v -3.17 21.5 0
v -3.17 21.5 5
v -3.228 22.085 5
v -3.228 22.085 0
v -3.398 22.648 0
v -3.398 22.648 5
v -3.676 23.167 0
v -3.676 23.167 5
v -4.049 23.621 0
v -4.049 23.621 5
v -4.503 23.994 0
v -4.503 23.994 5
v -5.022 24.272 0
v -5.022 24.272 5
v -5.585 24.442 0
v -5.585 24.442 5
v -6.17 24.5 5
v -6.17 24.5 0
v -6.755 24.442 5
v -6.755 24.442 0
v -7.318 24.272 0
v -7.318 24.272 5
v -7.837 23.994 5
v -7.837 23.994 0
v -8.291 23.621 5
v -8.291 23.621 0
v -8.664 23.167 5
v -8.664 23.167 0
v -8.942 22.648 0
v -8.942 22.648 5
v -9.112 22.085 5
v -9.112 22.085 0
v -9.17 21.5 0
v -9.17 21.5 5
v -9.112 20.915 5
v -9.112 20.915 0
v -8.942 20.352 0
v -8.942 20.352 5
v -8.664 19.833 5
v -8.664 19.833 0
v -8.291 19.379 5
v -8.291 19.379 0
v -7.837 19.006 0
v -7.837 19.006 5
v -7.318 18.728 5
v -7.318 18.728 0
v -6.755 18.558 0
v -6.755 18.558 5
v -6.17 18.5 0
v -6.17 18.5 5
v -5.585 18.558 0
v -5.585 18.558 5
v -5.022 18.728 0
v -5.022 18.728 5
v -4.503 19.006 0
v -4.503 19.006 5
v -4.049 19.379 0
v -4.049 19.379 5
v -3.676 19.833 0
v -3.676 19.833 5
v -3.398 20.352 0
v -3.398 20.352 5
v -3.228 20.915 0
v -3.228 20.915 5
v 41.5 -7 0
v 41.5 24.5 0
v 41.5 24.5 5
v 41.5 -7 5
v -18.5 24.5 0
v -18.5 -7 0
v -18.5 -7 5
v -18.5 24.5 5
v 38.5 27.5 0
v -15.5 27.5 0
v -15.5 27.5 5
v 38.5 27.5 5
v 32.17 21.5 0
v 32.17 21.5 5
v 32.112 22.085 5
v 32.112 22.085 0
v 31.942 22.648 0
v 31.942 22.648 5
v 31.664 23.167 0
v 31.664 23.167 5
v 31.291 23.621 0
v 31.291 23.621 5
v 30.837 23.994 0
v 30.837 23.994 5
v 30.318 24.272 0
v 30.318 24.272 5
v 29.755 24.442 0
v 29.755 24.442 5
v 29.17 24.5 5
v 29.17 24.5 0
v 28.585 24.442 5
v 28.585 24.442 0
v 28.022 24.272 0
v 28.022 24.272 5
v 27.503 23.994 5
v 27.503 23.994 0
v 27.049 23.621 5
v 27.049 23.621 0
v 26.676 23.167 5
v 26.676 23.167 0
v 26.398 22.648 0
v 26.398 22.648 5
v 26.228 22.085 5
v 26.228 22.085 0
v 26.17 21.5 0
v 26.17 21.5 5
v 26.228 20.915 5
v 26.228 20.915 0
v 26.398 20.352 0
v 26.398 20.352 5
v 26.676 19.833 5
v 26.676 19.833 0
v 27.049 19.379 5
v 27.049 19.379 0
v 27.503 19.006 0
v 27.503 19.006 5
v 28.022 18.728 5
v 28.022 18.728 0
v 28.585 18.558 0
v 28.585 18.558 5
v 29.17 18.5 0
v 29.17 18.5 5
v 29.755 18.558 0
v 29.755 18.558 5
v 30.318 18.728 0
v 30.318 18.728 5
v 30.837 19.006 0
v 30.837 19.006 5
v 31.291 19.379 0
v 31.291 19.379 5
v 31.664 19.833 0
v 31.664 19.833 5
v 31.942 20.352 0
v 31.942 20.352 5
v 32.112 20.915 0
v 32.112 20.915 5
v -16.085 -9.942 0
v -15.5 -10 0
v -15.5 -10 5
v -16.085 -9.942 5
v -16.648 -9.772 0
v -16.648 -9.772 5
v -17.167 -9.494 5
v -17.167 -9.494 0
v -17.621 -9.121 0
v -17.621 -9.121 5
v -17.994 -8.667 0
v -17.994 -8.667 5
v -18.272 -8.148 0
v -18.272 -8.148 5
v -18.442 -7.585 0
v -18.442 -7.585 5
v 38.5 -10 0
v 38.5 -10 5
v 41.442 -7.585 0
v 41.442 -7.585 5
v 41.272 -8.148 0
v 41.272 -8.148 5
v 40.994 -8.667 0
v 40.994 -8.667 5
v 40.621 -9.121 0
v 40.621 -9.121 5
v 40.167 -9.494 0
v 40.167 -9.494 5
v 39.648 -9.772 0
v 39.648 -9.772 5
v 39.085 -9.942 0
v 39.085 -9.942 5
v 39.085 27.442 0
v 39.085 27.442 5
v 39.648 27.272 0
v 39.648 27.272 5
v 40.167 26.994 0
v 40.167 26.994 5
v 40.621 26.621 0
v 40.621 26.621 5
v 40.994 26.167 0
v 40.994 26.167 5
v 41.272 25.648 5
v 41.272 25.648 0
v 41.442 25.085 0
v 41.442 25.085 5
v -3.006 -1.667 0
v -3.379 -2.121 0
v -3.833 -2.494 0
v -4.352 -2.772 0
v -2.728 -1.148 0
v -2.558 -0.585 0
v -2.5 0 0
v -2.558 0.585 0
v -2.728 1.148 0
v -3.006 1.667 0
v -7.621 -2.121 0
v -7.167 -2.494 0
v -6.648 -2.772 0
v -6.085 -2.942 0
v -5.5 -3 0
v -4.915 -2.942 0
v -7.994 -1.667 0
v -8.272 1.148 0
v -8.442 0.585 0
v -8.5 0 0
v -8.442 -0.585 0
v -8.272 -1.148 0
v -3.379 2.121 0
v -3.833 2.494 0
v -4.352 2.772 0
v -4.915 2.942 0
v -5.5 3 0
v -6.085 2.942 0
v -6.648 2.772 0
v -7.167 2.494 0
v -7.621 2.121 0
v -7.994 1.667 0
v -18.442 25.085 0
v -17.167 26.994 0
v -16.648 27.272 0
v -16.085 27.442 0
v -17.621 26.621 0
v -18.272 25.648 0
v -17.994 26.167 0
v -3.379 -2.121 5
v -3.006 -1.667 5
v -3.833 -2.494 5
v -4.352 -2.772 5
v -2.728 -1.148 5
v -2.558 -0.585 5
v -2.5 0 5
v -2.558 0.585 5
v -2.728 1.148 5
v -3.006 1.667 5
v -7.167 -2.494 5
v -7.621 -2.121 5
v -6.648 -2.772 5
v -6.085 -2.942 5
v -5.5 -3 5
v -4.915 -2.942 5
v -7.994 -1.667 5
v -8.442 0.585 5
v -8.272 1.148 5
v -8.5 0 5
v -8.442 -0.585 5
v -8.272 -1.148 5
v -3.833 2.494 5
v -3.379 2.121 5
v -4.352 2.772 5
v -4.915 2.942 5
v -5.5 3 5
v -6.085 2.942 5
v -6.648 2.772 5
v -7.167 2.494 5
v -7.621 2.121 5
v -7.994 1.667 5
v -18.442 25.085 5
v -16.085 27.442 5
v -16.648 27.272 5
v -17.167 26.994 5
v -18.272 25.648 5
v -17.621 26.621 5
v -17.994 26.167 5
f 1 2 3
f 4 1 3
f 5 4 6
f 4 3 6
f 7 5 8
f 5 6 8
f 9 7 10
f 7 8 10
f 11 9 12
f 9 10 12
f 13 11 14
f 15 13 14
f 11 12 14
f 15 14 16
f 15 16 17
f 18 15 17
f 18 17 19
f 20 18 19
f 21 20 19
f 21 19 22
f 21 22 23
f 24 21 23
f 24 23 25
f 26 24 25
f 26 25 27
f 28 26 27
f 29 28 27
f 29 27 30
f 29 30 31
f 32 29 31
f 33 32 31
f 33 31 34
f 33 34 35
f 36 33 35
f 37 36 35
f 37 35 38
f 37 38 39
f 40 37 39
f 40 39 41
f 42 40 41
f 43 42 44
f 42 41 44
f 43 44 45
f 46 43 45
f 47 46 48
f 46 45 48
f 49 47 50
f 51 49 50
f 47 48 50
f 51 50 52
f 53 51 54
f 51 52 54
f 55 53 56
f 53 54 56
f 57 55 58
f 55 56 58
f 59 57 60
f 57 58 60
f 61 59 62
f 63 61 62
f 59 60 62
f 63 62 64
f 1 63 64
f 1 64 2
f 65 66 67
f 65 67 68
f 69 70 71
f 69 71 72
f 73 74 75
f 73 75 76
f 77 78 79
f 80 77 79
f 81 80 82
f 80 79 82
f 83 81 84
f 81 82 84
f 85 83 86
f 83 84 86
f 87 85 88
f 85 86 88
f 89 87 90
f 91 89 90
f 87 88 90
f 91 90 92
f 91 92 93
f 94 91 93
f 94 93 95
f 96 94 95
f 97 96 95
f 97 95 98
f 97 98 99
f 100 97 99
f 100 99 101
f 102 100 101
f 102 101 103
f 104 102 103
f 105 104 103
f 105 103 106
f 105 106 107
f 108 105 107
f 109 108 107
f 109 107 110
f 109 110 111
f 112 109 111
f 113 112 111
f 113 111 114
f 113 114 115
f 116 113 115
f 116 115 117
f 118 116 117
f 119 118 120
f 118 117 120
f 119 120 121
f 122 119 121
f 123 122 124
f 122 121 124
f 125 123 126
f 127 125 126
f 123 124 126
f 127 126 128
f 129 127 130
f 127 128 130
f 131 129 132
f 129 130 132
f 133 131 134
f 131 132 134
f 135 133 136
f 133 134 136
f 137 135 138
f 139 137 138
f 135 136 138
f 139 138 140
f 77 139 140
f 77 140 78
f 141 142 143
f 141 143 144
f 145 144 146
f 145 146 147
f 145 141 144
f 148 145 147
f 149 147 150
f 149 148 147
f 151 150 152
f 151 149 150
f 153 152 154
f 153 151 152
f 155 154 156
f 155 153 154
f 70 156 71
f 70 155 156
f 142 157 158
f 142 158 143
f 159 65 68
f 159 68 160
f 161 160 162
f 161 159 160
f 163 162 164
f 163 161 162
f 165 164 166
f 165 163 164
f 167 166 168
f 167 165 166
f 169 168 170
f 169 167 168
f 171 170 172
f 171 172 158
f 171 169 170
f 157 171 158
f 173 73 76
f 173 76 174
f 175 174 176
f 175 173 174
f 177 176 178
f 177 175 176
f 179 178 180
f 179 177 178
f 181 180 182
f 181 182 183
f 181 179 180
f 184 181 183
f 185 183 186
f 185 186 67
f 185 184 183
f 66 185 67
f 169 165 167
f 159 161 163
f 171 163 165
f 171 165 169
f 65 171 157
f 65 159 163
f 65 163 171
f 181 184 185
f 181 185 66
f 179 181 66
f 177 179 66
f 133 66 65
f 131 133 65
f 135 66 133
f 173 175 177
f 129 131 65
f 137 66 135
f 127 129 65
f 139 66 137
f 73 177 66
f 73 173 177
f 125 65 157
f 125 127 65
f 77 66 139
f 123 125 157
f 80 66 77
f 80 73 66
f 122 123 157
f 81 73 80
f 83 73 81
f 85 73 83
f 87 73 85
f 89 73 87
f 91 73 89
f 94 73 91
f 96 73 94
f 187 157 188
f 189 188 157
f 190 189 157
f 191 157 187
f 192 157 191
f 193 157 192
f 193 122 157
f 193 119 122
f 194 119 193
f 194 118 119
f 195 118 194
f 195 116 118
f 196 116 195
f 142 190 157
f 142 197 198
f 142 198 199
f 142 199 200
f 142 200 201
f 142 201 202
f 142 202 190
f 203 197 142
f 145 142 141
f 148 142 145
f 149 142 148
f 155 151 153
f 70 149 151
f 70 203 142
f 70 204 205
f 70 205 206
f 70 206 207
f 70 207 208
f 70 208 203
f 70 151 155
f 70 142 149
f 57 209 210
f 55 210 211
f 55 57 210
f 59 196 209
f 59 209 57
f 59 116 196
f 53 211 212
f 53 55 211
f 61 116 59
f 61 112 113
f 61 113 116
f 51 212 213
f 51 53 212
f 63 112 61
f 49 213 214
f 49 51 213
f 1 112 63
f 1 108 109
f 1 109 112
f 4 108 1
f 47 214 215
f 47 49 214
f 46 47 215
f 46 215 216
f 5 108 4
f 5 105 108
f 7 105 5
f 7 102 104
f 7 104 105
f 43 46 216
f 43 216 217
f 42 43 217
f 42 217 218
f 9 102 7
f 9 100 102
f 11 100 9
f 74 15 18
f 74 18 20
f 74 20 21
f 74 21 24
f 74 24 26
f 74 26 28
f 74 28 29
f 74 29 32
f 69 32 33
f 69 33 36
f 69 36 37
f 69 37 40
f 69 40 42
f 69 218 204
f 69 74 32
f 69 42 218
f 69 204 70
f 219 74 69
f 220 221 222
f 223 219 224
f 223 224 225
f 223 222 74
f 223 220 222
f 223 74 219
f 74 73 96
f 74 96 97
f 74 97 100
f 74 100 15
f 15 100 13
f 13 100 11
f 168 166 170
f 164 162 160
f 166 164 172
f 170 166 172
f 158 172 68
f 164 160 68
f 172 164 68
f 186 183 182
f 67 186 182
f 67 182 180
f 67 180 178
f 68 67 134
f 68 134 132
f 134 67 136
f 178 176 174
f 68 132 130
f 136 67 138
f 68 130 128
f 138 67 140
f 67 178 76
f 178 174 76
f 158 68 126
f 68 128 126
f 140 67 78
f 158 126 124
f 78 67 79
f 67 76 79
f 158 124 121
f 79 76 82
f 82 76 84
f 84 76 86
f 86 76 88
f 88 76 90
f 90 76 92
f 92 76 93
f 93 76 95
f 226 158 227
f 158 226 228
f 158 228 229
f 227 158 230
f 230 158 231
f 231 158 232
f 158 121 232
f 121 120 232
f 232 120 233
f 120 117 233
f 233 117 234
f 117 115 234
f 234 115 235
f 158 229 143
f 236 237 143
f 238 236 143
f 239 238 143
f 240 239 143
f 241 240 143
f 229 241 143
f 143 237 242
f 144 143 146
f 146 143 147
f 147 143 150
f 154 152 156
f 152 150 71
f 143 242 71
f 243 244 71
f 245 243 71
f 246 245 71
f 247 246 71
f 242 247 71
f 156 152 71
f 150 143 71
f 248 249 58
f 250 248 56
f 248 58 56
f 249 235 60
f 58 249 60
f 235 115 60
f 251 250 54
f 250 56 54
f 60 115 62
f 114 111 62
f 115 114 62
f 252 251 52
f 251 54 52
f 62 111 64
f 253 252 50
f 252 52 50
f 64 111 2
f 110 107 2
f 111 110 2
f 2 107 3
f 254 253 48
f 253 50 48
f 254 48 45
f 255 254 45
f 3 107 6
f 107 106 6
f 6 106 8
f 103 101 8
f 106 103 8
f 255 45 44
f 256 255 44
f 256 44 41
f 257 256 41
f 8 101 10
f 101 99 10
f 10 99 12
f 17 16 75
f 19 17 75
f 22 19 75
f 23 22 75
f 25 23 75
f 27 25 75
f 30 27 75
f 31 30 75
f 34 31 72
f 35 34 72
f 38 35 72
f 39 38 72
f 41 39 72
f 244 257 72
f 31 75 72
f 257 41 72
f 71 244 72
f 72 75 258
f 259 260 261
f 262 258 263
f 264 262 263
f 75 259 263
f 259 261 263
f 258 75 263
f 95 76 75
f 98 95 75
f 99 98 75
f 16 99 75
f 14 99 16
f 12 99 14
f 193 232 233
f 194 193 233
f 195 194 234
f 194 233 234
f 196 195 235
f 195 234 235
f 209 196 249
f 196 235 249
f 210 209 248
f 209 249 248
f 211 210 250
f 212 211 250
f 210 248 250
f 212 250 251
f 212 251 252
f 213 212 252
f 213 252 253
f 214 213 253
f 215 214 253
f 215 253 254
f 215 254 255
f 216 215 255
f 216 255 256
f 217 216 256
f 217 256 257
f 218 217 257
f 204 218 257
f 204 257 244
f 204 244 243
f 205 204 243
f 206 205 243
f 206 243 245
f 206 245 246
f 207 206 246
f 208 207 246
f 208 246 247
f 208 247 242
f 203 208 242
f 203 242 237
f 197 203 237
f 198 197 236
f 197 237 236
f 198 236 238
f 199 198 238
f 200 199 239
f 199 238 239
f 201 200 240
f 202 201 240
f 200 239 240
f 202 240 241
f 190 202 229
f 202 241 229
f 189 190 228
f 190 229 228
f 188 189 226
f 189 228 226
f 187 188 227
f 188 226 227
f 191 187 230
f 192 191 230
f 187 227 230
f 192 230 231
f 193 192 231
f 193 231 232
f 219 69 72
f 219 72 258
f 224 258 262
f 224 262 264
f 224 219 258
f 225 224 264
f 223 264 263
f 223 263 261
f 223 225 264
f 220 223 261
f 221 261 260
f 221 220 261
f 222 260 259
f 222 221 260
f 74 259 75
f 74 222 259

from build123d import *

# Parameters (mm, degrees)
EXTRUDE_1_DEPTH     = 5
SKETCH_2_R          = 3
CUT_EXTRUDE_1_DEPTH = 10
SKETCH_4_R          = 3
CUT_EXTRUDE_2_DEPTH = 10


with BuildPart() as part:
    # 草图1 → 凸台-拉伸1 (new body)
    with BuildSketch(Plane.XY):
        with BuildLine():
            Line((-15.5, 27.5), (38.5, 27.5))
            ThreePointArc((38.5, 27.5), (40.621320344, 26.621320344), (41.5, 24.5))
            Line((41.5, 24.5), (41.5, -7))
            ThreePointArc((41.5, -7), (40.621320344, -9.121320344), (38.5, -10))
            Line((38.5, -10), (33.3, -10))
            Line((33.3, -10), (31.175, -10))
            Line((31.175, -10), (-8.825, -10))
            Line((-8.825, -10), (-15.5, -10))
            ThreePointArc((-15.5, -10), (-17.621320344, -9.121320344), (-18.5, -7))
            Line((-18.5, -7), (-18.5, 24.5))
            ThreePointArc((-18.5, 24.5), (-17.621320344, 26.621320344), (-15.5, 27.5))
        make_face()
    extrude(amount=EXTRUDE_1_DEPTH)

    # 草图2 → 切除-拉伸1 (cut)
    with BuildSketch(Plane.XY.offset(5)):
        with Locations((-6.17, 21.5)):
            Circle(SKETCH_2_R)
        with Locations((29.17, 21.5)):
            Circle(SKETCH_2_R)
    extrude(amount=-CUT_EXTRUDE_1_DEPTH, mode=Mode.SUBTRACT)

    # 草图4 → 切除-拉伸2 (cut)
    with BuildSketch(Plane.XY.offset(5)):
        with Locations((-5.5, 0)):
            Circle(SKETCH_4_R)
    extrude(amount=-CUT_EXTRUDE_2_DEPTH, mode=Mode.SUBTRACT)


solid = part.part
